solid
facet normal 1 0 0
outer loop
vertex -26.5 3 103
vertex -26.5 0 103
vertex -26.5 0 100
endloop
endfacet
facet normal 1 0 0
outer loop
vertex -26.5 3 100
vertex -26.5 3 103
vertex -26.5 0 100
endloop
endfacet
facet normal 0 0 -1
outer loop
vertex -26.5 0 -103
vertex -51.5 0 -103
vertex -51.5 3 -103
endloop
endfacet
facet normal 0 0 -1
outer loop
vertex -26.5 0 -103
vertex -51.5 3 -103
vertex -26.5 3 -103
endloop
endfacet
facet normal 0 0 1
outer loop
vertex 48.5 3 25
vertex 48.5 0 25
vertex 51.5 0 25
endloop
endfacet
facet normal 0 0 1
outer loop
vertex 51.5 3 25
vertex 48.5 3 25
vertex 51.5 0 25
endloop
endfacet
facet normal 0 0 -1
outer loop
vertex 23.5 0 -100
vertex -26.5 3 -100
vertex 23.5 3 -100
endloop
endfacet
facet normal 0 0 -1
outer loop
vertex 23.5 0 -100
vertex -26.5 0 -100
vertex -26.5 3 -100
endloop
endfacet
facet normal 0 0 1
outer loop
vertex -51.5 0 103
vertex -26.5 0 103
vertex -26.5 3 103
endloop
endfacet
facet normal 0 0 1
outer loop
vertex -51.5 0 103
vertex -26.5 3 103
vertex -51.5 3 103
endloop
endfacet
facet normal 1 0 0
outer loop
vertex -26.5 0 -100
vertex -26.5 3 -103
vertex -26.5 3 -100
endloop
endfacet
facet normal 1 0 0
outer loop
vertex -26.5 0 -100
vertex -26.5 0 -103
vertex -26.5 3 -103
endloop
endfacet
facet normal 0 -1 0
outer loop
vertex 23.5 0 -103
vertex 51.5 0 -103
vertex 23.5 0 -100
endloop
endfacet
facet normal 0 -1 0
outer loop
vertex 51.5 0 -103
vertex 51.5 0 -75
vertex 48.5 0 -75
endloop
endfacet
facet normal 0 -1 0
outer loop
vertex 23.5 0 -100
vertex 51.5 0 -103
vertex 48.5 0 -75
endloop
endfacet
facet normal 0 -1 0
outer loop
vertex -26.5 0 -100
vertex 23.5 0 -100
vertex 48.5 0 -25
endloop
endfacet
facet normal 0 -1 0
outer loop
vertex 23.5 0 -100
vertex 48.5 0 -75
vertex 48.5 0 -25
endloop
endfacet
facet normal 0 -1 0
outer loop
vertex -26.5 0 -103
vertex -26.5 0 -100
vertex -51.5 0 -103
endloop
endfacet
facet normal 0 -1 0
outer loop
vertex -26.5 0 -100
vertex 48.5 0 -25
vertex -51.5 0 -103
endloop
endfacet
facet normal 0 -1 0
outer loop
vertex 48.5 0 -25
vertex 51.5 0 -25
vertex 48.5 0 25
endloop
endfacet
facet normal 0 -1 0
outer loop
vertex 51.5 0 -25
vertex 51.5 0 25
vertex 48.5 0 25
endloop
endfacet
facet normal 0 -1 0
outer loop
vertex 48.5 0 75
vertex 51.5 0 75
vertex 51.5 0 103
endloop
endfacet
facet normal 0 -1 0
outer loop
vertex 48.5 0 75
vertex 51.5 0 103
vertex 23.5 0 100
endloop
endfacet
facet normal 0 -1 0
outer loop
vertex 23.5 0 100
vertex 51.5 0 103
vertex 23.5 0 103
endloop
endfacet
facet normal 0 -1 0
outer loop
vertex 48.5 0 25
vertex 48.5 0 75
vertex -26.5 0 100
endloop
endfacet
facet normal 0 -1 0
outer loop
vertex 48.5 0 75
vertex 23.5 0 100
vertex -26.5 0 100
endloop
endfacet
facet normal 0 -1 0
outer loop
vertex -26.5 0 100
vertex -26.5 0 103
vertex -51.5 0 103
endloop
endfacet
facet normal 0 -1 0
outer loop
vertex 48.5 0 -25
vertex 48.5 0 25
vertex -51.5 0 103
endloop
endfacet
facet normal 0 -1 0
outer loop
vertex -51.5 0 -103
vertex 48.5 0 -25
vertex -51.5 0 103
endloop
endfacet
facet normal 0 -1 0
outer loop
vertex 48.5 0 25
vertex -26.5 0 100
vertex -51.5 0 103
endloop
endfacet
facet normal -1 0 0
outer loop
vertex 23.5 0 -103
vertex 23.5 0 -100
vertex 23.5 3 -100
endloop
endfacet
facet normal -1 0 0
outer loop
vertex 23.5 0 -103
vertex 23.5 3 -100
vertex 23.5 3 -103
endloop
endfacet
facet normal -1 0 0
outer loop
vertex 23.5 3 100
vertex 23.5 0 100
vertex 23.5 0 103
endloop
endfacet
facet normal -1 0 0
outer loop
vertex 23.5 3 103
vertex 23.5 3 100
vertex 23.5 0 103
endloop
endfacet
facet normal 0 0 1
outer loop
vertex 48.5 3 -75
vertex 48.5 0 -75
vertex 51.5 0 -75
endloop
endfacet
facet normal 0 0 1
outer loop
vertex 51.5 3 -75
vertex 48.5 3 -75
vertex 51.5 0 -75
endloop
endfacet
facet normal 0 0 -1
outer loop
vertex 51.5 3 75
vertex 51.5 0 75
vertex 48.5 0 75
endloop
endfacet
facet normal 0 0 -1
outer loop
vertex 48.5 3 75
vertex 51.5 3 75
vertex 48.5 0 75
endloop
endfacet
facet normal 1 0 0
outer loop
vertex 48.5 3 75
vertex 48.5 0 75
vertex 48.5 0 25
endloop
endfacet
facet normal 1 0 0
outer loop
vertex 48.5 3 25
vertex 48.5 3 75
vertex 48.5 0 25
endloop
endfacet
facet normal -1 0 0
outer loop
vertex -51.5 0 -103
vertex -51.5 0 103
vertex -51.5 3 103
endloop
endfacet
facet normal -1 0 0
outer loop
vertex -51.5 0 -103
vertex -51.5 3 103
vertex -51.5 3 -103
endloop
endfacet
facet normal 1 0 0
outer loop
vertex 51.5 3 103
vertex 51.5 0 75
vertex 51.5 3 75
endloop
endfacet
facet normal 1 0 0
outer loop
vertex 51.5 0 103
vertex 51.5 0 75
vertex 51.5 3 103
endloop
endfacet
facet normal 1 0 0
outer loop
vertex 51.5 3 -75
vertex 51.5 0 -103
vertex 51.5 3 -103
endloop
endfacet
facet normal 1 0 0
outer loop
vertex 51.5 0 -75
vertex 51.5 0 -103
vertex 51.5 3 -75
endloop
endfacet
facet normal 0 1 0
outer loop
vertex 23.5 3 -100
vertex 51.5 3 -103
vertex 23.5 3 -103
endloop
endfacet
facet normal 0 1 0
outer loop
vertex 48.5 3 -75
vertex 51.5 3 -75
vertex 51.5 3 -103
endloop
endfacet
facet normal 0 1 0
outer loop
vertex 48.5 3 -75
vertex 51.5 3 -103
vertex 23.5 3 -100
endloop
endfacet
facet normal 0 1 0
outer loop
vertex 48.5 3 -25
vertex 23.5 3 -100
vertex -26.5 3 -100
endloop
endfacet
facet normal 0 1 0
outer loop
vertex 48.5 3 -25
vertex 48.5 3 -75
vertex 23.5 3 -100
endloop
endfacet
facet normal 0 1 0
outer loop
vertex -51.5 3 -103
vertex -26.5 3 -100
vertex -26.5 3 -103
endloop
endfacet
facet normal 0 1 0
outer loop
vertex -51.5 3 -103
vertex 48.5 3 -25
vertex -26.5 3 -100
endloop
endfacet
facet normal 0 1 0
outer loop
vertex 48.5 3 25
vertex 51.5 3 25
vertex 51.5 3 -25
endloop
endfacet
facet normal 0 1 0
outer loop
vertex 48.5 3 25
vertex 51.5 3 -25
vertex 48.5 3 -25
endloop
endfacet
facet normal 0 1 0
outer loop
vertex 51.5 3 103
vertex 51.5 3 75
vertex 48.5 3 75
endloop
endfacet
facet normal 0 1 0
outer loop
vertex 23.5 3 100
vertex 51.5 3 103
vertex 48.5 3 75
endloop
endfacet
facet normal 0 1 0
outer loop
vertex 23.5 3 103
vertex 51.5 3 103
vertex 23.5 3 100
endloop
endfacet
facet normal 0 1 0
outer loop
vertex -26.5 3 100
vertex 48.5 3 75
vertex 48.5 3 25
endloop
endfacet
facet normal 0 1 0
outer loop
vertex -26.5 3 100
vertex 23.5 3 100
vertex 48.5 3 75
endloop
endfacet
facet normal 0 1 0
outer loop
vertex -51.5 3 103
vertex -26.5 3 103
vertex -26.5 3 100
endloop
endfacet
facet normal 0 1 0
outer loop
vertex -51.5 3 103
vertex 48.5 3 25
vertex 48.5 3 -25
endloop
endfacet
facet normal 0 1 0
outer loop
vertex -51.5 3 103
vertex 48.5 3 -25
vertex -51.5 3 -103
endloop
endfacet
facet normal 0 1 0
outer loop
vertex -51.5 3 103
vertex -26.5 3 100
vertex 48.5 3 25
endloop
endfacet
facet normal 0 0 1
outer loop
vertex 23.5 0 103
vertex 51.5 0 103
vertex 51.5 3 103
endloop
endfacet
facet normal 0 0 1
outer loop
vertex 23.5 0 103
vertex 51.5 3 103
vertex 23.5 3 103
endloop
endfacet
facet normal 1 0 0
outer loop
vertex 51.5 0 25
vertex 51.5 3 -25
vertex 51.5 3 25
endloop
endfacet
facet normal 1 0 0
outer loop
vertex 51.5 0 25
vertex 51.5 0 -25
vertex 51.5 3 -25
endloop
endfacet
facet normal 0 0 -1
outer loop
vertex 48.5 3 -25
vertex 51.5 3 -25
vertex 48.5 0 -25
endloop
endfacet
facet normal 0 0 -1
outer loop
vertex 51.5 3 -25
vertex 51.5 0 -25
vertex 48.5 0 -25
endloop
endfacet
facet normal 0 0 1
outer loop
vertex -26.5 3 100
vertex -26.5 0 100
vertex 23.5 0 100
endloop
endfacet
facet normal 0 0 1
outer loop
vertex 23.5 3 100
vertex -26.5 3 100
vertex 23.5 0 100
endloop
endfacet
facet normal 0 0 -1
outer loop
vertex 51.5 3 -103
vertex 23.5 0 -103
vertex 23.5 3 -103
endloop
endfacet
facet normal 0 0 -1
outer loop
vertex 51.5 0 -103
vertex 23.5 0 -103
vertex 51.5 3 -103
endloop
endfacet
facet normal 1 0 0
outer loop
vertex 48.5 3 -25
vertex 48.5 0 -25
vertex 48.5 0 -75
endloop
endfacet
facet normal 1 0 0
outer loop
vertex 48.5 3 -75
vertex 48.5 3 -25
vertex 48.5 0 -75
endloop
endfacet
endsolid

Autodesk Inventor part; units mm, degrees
ref_plane "YZ Plane" through (0, 0, 0) normal (1, 0, 0) x (0, 1, 0)
ref_plane "XZ Plane" through (0, 0, 0) normal (0, 1, 0) x (-1, 0, 0)
ref_plane "XY Plane" through (0, 0, 0) normal (0, 0, 1) x (1, 0, 0)
sketch "Boceto1" plane through (0, 0, 0) normal (0, 1, 0) x (-1, 0, 0)
  line L0 (51.5, 103) -> (51.5, -103)
  line L1 (-51.5, 103) -> (51.5, -103) construction
  line L2 (51.5, 103) -> (-51.5, -103) construction
  line L3 (26.5, 103) -> (26.5, 100)
  line L4 (26.5, 100) -> (-23.5, 100)
  line L5 (-23.5, 100) -> (-23.5, 103)
  line L6 (-51.5, 103) -> (-23.5, 103)
  line L7 (26.5, 103) -> (51.5, 103)
  line L8 (26.5, -103) -> (26.5, -100)
  line L9 (26.5, -100) -> (-23.5, -100)
  line L10 (-23.5, -100) -> (-23.5, -103)
  line L11 (51.5, -103) -> (26.5, -103)
  line L12 (-23.5, -103) -> (-51.5, -103)
  line L13 (-51.5, 75) -> (-48.5, 75)
  line L14 (-48.5, 75) -> (-48.5, 25)
  line L15 (-48.5, 25) -> (-51.5, 25)
  line L16 (-51.5, 75) -> (-51.5, 103)
  line L17 (-51.5, -25) -> (-48.5, -25)
  line L18 (-48.5, -25) -> (-48.5, -75)
  line L19 (-48.5, -75) -> (-51.5, -75)
  line L20 (-51.5, -103) -> (-51.5, -75)
  line L21 (-51.5, -25) -> (-51.5, 25)
  point P0 (0, 0)
  dimension "d4" = 3
  dimension "d5" = 50
  dimension "d7" = 3
  dimension "d8" = 50
  dimension "d24" = 50
  dimension "d30" = 3
  dimension "d33" = 25
  dimension "d35" = 100
  dimension "d36" = 25
  dimension "d38" = 200
extrude "Extrusión1" add sketch "Boceto1" along normal blind 3
properties part number "Piso"
